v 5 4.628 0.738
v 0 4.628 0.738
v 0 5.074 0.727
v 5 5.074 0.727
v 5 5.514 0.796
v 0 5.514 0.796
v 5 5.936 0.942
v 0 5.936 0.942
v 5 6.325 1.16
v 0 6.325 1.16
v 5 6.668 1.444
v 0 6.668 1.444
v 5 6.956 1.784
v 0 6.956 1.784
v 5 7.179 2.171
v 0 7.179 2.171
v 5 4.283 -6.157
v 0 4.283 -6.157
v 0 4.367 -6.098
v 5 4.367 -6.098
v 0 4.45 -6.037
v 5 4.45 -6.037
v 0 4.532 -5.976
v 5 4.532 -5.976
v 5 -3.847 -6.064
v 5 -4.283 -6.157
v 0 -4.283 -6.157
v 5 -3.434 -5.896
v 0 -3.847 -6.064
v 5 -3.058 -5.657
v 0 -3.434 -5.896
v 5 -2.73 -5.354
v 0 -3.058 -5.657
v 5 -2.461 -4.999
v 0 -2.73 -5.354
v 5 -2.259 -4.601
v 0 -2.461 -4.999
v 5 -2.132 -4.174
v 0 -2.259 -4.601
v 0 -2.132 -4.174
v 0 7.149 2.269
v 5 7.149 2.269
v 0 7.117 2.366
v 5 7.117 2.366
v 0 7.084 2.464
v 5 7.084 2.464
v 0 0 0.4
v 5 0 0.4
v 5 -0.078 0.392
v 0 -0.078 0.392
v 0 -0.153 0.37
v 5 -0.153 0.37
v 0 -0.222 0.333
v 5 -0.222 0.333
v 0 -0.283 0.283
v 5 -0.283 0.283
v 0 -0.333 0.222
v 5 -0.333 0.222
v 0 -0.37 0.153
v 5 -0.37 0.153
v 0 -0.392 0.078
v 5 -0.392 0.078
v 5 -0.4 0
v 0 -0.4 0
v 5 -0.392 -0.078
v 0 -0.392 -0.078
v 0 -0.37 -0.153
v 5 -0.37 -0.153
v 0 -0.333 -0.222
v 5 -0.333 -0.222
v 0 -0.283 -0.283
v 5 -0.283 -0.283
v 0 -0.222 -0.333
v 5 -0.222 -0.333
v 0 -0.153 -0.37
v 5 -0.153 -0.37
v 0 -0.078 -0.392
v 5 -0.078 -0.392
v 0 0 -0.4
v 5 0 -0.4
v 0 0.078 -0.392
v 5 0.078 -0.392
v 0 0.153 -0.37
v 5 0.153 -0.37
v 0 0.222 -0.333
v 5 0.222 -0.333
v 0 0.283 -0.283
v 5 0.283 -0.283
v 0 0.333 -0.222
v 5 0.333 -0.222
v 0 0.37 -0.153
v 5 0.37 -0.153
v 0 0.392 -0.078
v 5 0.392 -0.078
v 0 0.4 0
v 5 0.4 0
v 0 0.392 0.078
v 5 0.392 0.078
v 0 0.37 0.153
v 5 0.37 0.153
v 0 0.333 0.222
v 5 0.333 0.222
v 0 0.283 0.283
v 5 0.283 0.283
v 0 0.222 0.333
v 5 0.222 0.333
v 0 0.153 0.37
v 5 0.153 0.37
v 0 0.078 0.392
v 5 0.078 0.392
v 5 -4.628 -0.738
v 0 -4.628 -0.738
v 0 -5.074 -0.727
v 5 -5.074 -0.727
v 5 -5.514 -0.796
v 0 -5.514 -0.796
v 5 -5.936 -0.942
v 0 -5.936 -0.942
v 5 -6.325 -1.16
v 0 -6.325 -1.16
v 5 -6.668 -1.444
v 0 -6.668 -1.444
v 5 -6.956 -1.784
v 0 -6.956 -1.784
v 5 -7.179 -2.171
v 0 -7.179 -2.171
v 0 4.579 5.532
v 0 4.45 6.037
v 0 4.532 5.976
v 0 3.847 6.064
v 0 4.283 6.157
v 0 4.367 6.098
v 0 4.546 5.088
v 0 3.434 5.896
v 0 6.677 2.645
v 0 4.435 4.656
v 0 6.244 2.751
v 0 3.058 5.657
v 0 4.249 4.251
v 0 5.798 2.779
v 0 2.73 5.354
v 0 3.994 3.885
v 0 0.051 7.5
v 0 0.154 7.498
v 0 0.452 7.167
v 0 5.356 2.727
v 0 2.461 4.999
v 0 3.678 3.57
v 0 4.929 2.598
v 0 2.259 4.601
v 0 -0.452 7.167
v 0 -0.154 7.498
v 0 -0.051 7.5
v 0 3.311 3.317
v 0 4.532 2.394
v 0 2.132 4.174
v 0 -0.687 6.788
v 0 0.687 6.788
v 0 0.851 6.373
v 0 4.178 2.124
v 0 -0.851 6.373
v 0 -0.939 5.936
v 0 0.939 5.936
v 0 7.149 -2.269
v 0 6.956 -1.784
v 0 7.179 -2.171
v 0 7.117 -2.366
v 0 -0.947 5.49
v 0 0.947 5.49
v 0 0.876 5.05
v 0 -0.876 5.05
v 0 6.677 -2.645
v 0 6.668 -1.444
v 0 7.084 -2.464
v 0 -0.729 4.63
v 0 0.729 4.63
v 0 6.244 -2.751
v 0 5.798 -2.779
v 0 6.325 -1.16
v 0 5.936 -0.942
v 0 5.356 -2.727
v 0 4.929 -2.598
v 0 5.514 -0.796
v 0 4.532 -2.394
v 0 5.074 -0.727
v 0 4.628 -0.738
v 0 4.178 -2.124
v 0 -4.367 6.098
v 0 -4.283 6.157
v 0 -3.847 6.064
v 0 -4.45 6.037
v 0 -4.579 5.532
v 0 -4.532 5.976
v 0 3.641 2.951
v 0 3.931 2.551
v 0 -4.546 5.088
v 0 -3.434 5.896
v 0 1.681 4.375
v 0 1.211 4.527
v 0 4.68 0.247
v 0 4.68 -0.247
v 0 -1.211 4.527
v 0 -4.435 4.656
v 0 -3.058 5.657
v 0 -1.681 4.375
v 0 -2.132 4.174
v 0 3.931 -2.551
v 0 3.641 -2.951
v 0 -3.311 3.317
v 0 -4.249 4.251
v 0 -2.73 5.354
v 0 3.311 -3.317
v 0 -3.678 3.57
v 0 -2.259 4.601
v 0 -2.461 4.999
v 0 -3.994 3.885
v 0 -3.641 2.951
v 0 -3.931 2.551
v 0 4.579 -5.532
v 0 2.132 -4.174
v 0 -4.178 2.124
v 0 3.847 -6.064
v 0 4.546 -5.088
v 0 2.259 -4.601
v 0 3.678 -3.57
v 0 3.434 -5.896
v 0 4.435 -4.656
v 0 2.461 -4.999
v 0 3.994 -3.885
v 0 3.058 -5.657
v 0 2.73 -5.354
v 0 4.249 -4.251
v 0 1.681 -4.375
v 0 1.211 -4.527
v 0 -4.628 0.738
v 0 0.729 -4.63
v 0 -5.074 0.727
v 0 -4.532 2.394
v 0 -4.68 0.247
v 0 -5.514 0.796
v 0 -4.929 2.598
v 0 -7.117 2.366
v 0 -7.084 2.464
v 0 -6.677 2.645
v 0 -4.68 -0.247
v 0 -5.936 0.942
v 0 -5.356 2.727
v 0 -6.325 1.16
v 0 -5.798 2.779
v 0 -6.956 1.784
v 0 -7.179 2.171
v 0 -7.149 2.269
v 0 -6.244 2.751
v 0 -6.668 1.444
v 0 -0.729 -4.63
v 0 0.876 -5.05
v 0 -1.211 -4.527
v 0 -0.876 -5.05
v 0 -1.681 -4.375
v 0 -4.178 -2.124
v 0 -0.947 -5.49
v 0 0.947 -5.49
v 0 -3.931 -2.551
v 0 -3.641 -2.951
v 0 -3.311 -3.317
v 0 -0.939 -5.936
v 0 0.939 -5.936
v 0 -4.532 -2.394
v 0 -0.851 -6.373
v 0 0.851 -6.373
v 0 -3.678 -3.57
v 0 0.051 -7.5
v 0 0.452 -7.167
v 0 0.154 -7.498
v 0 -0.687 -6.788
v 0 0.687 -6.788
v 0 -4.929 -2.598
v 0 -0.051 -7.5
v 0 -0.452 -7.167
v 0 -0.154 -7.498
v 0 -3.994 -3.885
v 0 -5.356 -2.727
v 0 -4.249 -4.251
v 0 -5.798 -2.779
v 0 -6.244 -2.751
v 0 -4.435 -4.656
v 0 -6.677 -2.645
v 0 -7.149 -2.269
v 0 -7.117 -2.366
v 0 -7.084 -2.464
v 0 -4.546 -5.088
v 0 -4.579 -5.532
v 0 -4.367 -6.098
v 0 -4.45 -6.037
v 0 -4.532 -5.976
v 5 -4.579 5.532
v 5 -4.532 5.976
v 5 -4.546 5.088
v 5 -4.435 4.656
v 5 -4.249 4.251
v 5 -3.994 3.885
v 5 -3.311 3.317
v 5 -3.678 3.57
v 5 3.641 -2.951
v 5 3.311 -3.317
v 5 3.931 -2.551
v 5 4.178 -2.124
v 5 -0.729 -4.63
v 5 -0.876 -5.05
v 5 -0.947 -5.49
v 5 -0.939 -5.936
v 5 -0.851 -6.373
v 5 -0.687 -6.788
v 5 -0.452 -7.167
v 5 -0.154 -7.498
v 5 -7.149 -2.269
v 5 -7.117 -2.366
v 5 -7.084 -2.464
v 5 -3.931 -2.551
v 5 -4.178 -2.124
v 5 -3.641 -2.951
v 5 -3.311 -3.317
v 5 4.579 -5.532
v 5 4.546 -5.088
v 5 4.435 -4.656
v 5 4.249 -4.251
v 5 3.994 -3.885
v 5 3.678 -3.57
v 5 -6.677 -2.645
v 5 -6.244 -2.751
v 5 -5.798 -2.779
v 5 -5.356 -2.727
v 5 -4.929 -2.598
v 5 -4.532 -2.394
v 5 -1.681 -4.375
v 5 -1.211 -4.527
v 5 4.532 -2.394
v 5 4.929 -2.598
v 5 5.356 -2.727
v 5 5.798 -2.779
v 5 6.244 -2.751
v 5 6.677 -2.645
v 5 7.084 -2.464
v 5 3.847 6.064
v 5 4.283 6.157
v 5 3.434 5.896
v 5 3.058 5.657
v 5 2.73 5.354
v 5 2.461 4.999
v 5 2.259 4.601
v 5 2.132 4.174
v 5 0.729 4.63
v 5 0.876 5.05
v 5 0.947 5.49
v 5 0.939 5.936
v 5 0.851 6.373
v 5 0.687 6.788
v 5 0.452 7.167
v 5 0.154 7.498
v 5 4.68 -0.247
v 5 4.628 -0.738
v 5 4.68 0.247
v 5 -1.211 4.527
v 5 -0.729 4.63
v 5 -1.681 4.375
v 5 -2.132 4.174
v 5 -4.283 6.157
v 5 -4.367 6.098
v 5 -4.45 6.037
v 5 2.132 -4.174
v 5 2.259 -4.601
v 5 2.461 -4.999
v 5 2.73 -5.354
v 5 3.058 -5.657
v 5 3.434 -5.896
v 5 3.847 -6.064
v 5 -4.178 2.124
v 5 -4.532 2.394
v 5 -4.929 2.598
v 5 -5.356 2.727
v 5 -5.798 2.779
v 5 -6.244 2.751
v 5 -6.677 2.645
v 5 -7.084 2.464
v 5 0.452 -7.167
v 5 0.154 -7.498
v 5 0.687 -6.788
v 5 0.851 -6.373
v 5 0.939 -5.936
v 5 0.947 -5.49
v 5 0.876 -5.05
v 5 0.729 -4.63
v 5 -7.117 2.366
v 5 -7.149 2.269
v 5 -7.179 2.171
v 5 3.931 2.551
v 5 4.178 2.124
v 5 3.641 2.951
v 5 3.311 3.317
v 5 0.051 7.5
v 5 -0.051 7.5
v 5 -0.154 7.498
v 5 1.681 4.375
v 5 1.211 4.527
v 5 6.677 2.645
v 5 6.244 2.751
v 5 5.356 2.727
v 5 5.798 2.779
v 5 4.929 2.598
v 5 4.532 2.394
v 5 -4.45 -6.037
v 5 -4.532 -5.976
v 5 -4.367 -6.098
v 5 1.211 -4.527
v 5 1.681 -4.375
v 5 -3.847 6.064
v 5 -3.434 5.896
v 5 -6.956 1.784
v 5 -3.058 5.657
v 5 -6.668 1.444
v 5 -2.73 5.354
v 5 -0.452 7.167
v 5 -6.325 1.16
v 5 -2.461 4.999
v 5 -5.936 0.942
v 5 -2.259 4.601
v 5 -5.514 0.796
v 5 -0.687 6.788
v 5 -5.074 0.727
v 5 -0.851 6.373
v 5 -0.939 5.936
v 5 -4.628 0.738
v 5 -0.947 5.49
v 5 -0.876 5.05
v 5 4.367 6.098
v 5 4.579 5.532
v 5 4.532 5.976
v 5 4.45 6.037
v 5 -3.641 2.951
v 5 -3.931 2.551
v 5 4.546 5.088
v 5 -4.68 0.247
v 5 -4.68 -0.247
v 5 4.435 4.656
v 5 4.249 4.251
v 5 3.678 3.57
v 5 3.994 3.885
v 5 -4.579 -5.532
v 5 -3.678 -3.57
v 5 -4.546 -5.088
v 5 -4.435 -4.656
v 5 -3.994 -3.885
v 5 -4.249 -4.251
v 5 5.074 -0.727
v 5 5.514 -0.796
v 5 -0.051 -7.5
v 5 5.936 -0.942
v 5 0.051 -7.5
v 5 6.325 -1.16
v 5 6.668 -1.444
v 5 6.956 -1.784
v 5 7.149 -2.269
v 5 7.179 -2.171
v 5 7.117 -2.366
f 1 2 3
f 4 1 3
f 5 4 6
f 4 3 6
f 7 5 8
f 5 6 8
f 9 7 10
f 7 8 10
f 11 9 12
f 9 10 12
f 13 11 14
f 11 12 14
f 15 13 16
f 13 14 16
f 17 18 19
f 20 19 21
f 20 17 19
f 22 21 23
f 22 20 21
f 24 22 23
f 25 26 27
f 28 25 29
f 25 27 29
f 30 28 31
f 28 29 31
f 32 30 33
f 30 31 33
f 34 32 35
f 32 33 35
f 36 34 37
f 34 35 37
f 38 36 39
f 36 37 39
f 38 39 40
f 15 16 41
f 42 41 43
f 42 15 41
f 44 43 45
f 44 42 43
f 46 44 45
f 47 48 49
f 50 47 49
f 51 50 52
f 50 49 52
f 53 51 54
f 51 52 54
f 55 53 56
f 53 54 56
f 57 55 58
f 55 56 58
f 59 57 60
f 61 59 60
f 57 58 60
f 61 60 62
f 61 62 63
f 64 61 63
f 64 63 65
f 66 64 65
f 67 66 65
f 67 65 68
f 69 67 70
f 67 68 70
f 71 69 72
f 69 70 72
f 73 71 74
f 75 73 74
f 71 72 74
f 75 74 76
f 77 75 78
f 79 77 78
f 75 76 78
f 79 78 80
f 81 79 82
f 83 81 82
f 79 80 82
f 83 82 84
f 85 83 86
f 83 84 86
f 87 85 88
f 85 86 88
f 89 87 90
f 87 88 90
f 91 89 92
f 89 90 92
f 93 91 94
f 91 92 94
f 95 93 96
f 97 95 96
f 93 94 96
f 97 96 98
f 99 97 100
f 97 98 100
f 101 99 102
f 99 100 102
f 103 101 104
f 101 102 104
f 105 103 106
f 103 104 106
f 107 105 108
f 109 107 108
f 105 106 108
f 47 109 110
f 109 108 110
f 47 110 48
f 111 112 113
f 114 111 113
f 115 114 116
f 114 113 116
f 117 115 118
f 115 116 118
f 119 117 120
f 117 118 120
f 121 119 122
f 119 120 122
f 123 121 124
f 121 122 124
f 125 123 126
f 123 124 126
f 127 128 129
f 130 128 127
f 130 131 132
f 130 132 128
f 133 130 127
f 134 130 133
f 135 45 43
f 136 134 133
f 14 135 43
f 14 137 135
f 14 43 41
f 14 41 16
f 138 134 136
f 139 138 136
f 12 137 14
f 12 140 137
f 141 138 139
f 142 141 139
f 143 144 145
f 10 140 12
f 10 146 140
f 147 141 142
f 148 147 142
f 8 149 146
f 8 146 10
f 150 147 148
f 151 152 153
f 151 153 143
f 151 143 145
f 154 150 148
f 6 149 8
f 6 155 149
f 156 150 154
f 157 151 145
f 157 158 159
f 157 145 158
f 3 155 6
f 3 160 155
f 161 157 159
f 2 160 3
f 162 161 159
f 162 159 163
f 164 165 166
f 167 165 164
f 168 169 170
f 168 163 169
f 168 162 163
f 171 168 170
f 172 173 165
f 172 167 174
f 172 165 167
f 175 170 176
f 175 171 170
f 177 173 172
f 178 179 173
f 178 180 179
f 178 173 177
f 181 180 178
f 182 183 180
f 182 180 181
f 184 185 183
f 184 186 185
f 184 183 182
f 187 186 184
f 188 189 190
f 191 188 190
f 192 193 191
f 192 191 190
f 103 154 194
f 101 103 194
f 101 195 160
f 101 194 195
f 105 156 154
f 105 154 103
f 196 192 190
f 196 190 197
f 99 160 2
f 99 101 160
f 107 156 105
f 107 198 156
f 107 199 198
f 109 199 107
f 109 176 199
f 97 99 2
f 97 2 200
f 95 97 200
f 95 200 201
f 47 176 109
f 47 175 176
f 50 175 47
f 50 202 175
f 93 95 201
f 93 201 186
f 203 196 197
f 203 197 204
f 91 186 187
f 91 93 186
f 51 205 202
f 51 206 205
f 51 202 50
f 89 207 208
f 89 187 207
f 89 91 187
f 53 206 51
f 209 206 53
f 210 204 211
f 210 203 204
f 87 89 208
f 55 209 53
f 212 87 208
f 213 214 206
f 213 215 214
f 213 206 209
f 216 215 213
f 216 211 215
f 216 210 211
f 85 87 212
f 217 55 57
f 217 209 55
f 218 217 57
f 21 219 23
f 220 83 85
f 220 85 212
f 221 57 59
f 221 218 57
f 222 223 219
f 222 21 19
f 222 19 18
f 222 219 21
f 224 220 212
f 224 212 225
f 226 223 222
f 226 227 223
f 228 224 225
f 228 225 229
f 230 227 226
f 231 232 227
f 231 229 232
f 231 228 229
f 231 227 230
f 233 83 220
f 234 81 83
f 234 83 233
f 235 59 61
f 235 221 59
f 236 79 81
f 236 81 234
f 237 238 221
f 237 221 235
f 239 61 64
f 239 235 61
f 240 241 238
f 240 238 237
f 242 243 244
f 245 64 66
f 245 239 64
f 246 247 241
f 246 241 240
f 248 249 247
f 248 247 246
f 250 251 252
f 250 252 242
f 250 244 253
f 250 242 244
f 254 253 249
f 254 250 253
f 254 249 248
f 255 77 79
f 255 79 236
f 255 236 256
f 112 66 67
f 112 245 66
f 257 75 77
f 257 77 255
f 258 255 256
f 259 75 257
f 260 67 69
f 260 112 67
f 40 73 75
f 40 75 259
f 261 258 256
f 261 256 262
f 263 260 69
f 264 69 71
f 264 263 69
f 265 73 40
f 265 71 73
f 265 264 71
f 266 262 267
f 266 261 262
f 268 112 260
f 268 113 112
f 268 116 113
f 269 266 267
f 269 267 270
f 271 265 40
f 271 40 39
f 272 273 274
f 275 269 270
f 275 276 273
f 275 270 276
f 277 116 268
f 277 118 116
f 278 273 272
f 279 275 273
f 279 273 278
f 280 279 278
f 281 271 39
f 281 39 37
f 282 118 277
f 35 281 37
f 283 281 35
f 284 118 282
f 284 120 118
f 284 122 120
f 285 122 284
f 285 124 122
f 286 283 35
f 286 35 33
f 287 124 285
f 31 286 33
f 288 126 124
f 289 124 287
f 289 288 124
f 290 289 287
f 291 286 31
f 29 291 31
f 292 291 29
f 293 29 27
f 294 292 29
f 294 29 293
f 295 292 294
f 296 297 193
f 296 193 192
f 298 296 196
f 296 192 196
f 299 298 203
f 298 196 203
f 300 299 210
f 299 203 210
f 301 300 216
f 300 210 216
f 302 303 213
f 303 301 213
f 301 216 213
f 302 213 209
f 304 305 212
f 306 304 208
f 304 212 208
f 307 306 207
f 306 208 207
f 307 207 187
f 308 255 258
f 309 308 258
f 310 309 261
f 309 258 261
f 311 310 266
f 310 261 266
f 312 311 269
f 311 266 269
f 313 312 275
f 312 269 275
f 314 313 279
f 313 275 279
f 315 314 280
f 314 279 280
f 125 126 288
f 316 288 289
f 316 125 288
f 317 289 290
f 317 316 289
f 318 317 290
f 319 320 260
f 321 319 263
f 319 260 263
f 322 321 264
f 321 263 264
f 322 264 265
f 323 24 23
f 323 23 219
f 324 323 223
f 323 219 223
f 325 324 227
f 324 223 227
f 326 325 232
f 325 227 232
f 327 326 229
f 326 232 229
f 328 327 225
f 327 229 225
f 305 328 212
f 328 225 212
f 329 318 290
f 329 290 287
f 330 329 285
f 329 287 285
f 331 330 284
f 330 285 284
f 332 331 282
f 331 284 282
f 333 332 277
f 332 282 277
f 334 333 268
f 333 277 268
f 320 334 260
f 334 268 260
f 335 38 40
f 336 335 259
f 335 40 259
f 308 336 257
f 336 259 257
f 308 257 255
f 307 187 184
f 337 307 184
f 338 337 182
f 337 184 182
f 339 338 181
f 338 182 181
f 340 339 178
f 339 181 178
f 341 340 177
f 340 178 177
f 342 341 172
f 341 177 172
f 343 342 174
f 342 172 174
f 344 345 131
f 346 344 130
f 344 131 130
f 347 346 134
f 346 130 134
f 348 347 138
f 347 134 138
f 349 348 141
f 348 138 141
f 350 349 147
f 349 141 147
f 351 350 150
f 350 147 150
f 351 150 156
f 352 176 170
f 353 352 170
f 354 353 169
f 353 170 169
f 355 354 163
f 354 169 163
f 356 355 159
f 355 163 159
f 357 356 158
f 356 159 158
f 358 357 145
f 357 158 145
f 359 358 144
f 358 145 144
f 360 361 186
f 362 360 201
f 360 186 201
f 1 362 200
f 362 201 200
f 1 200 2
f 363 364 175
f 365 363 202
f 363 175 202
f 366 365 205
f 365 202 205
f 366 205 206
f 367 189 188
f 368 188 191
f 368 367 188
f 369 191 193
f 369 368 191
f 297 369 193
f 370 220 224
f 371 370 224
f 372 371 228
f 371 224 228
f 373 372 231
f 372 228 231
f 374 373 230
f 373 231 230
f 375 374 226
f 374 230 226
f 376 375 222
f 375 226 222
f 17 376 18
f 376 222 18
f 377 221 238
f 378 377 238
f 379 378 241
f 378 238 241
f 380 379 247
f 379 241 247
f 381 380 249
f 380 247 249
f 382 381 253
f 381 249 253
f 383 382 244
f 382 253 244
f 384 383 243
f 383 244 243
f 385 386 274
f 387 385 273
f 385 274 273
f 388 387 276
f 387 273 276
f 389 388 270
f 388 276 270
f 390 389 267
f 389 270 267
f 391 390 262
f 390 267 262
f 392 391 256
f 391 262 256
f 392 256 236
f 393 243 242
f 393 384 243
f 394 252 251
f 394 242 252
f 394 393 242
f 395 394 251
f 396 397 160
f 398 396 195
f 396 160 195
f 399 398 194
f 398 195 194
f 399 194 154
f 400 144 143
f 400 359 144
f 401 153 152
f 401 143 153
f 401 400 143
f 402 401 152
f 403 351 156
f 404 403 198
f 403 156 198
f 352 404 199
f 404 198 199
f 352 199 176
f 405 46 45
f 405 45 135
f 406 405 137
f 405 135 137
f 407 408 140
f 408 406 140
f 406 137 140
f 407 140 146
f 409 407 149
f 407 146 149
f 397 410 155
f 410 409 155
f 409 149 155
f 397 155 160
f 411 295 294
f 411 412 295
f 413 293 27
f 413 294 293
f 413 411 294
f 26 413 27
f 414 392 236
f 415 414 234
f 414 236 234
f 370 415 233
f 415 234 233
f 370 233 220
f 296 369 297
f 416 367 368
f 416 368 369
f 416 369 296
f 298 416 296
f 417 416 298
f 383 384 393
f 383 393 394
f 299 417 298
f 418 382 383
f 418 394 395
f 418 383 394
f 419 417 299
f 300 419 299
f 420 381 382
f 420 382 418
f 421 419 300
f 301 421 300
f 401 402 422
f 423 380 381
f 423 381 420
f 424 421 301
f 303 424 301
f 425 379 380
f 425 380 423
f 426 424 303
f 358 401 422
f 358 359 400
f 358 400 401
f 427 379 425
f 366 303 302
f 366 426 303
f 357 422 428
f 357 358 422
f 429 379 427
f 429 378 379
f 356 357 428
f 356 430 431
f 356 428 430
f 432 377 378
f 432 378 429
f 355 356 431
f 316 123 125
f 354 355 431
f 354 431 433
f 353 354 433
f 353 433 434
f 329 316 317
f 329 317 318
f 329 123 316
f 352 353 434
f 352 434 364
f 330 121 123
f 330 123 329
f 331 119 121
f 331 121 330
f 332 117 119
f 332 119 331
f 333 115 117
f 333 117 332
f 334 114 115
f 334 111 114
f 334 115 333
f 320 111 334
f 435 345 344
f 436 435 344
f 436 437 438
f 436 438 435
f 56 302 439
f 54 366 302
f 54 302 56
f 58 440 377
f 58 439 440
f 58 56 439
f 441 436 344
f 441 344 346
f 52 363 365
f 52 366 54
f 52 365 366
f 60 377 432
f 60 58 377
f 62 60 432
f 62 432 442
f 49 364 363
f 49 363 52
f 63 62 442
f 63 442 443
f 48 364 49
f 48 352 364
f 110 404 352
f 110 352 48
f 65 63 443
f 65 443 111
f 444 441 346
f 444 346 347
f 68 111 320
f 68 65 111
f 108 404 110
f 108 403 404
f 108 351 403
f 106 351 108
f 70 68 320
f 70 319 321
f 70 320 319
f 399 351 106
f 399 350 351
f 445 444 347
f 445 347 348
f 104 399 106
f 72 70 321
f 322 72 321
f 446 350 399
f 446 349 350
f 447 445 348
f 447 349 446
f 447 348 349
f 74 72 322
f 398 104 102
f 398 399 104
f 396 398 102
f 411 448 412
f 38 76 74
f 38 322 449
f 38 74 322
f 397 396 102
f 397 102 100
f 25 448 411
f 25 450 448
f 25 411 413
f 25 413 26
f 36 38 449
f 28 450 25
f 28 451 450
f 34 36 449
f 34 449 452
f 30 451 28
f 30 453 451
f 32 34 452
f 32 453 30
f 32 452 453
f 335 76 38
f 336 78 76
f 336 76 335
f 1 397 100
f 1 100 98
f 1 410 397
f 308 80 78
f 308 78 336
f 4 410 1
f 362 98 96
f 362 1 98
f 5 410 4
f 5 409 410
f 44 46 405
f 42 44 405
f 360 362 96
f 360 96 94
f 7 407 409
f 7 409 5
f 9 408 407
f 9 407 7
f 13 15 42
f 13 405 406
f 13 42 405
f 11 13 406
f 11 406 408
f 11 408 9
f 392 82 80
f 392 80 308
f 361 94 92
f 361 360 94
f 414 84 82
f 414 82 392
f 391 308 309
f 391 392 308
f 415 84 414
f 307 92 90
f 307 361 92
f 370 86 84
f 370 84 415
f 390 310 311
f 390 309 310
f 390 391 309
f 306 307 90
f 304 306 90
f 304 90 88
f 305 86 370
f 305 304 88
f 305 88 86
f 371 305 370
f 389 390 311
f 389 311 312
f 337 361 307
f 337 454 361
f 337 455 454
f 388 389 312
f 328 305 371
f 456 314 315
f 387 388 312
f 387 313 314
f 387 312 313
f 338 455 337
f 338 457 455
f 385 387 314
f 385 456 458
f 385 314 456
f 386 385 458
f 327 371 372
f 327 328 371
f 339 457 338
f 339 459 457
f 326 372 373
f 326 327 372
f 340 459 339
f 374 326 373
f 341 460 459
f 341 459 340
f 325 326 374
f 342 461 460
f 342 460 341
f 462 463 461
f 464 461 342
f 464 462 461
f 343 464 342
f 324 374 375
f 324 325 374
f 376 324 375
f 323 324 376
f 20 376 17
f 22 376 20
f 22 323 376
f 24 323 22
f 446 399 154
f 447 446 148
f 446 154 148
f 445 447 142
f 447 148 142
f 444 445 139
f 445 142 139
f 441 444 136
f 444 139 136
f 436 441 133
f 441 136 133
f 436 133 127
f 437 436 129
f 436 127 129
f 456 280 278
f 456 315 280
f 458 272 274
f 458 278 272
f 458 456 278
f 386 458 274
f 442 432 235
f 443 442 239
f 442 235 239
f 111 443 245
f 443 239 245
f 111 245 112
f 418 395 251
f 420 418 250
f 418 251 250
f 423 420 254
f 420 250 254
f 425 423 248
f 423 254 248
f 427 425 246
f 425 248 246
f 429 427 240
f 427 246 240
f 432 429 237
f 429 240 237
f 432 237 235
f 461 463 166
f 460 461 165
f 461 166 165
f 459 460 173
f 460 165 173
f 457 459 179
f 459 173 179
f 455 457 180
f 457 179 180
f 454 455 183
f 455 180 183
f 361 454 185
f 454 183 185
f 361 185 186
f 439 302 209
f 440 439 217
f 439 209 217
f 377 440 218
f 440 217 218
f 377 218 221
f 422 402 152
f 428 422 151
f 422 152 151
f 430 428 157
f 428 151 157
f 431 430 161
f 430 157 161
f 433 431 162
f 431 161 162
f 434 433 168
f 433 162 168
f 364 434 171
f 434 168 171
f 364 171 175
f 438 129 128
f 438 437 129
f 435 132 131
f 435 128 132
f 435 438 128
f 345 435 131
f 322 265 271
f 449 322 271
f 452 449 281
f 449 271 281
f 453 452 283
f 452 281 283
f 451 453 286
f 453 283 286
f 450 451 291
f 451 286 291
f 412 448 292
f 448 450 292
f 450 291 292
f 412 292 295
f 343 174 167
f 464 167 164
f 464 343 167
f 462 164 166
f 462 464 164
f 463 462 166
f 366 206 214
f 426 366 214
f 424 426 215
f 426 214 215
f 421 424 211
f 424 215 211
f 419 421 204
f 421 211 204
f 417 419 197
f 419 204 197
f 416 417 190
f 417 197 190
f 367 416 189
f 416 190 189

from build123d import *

# Parameters (mm, degrees)
BASPROSKE_W              = 12
BASPROSKE_H              = 7.5
TOOTHCUT_DEPTH           = 17.015617378
TEETHCUTS_COUNT          = 10
TEETHCUTS_ANGLE          = 324
BORSKE_R                 = 0.4
BORE_DEPTH               = 50.0000508
SCHIZZO1_W               = 18.724630976
SCHIZZO1_H               = 16.705622174
TAGLIO_ESTRUSIONE1_DEPTH = 7


with BuildPart() as part:
    # BasProSke → Base-Revolve (revolve)
    with BuildSketch(Plane(origin=(0, 0, 0), x_dir=(1, 0, 0), z_dir=(0, 1, 0)), mode=Mode.PRIVATE) as base_revolve_sk:
        with Locations((6, 3.75)):
            Rectangle(BASPROSKE_W, BASPROSKE_H)
    revolve(base_revolve_sk.sketch.rotate(Axis((-10, 0, 0), (1, 0, 0)), 180), axis=Axis((-10, 0, 0), (1, 0, 0)))

    # TooCutSke → ToothCut (cut, through all)
    with BuildSketch(Plane(origin=(0, 0, 0), x_dir=(0, 0, -1), z_dir=(1, 0, 0))):
        with BuildLine():
            ThreePointArc((0.737676151, 4.628079099), (0, 4.6865), (-0.737676151, 4.628079099))
            ThreePointArc((-0.737676151, 4.628079099), (-1.051542781, 6.151798382), (-2.205760267, 7.194877817))
            ThreePointArc((-2.205760267, 7.194877817), (0, 7.5254), (2.205760267, 7.194877817))
            ThreePointArc((2.205760267, 7.194877817), (1.051542781, 6.151798382), (0.737676151, 4.628079099))
        make_face()
    toothcut = extrude(amount=TOOTHCUT_DEPTH, mode=Mode.SUBTRACT)

    # TeethCuts: ToothCut ×10 about axis
    teethcuts_axis = Axis((-10, 0, 0), (1, 0, 0))
    for i in range(1, TEETHCUTS_COUNT):
        add(toothcut.rotate(teethcuts_axis, i * TEETHCUTS_ANGLE / (TEETHCUTS_COUNT - 1)), mode=Mode.SUBTRACT)

    # BorSke → Bore (cut, symmetric)
    with BuildSketch(Plane(origin=(0, 0, 0), x_dir=(0, 0, -1), z_dir=(1, 0, 0))):
        with Locations(Location((0, 0, 0), (0, 0, 180))):
            Circle(BORSKE_R)
    extrude(amount=BORE_DEPTH, both=True, mode=Mode.SUBTRACT)

    # Schizzo1 → Taglio-Estrusione1 (cut)
    with BuildSketch(Plane(origin=(12, 0, 0), x_dir=(0, 0, -1), z_dir=(1, 0, 0))):
        Rectangle(SCHIZZO1_W, SCHIZZO1_H)
    extrude(amount=-TAGLIO_ESTRUSIONE1_DEPTH, mode=Mode.SUBTRACT)


solid = part.part
